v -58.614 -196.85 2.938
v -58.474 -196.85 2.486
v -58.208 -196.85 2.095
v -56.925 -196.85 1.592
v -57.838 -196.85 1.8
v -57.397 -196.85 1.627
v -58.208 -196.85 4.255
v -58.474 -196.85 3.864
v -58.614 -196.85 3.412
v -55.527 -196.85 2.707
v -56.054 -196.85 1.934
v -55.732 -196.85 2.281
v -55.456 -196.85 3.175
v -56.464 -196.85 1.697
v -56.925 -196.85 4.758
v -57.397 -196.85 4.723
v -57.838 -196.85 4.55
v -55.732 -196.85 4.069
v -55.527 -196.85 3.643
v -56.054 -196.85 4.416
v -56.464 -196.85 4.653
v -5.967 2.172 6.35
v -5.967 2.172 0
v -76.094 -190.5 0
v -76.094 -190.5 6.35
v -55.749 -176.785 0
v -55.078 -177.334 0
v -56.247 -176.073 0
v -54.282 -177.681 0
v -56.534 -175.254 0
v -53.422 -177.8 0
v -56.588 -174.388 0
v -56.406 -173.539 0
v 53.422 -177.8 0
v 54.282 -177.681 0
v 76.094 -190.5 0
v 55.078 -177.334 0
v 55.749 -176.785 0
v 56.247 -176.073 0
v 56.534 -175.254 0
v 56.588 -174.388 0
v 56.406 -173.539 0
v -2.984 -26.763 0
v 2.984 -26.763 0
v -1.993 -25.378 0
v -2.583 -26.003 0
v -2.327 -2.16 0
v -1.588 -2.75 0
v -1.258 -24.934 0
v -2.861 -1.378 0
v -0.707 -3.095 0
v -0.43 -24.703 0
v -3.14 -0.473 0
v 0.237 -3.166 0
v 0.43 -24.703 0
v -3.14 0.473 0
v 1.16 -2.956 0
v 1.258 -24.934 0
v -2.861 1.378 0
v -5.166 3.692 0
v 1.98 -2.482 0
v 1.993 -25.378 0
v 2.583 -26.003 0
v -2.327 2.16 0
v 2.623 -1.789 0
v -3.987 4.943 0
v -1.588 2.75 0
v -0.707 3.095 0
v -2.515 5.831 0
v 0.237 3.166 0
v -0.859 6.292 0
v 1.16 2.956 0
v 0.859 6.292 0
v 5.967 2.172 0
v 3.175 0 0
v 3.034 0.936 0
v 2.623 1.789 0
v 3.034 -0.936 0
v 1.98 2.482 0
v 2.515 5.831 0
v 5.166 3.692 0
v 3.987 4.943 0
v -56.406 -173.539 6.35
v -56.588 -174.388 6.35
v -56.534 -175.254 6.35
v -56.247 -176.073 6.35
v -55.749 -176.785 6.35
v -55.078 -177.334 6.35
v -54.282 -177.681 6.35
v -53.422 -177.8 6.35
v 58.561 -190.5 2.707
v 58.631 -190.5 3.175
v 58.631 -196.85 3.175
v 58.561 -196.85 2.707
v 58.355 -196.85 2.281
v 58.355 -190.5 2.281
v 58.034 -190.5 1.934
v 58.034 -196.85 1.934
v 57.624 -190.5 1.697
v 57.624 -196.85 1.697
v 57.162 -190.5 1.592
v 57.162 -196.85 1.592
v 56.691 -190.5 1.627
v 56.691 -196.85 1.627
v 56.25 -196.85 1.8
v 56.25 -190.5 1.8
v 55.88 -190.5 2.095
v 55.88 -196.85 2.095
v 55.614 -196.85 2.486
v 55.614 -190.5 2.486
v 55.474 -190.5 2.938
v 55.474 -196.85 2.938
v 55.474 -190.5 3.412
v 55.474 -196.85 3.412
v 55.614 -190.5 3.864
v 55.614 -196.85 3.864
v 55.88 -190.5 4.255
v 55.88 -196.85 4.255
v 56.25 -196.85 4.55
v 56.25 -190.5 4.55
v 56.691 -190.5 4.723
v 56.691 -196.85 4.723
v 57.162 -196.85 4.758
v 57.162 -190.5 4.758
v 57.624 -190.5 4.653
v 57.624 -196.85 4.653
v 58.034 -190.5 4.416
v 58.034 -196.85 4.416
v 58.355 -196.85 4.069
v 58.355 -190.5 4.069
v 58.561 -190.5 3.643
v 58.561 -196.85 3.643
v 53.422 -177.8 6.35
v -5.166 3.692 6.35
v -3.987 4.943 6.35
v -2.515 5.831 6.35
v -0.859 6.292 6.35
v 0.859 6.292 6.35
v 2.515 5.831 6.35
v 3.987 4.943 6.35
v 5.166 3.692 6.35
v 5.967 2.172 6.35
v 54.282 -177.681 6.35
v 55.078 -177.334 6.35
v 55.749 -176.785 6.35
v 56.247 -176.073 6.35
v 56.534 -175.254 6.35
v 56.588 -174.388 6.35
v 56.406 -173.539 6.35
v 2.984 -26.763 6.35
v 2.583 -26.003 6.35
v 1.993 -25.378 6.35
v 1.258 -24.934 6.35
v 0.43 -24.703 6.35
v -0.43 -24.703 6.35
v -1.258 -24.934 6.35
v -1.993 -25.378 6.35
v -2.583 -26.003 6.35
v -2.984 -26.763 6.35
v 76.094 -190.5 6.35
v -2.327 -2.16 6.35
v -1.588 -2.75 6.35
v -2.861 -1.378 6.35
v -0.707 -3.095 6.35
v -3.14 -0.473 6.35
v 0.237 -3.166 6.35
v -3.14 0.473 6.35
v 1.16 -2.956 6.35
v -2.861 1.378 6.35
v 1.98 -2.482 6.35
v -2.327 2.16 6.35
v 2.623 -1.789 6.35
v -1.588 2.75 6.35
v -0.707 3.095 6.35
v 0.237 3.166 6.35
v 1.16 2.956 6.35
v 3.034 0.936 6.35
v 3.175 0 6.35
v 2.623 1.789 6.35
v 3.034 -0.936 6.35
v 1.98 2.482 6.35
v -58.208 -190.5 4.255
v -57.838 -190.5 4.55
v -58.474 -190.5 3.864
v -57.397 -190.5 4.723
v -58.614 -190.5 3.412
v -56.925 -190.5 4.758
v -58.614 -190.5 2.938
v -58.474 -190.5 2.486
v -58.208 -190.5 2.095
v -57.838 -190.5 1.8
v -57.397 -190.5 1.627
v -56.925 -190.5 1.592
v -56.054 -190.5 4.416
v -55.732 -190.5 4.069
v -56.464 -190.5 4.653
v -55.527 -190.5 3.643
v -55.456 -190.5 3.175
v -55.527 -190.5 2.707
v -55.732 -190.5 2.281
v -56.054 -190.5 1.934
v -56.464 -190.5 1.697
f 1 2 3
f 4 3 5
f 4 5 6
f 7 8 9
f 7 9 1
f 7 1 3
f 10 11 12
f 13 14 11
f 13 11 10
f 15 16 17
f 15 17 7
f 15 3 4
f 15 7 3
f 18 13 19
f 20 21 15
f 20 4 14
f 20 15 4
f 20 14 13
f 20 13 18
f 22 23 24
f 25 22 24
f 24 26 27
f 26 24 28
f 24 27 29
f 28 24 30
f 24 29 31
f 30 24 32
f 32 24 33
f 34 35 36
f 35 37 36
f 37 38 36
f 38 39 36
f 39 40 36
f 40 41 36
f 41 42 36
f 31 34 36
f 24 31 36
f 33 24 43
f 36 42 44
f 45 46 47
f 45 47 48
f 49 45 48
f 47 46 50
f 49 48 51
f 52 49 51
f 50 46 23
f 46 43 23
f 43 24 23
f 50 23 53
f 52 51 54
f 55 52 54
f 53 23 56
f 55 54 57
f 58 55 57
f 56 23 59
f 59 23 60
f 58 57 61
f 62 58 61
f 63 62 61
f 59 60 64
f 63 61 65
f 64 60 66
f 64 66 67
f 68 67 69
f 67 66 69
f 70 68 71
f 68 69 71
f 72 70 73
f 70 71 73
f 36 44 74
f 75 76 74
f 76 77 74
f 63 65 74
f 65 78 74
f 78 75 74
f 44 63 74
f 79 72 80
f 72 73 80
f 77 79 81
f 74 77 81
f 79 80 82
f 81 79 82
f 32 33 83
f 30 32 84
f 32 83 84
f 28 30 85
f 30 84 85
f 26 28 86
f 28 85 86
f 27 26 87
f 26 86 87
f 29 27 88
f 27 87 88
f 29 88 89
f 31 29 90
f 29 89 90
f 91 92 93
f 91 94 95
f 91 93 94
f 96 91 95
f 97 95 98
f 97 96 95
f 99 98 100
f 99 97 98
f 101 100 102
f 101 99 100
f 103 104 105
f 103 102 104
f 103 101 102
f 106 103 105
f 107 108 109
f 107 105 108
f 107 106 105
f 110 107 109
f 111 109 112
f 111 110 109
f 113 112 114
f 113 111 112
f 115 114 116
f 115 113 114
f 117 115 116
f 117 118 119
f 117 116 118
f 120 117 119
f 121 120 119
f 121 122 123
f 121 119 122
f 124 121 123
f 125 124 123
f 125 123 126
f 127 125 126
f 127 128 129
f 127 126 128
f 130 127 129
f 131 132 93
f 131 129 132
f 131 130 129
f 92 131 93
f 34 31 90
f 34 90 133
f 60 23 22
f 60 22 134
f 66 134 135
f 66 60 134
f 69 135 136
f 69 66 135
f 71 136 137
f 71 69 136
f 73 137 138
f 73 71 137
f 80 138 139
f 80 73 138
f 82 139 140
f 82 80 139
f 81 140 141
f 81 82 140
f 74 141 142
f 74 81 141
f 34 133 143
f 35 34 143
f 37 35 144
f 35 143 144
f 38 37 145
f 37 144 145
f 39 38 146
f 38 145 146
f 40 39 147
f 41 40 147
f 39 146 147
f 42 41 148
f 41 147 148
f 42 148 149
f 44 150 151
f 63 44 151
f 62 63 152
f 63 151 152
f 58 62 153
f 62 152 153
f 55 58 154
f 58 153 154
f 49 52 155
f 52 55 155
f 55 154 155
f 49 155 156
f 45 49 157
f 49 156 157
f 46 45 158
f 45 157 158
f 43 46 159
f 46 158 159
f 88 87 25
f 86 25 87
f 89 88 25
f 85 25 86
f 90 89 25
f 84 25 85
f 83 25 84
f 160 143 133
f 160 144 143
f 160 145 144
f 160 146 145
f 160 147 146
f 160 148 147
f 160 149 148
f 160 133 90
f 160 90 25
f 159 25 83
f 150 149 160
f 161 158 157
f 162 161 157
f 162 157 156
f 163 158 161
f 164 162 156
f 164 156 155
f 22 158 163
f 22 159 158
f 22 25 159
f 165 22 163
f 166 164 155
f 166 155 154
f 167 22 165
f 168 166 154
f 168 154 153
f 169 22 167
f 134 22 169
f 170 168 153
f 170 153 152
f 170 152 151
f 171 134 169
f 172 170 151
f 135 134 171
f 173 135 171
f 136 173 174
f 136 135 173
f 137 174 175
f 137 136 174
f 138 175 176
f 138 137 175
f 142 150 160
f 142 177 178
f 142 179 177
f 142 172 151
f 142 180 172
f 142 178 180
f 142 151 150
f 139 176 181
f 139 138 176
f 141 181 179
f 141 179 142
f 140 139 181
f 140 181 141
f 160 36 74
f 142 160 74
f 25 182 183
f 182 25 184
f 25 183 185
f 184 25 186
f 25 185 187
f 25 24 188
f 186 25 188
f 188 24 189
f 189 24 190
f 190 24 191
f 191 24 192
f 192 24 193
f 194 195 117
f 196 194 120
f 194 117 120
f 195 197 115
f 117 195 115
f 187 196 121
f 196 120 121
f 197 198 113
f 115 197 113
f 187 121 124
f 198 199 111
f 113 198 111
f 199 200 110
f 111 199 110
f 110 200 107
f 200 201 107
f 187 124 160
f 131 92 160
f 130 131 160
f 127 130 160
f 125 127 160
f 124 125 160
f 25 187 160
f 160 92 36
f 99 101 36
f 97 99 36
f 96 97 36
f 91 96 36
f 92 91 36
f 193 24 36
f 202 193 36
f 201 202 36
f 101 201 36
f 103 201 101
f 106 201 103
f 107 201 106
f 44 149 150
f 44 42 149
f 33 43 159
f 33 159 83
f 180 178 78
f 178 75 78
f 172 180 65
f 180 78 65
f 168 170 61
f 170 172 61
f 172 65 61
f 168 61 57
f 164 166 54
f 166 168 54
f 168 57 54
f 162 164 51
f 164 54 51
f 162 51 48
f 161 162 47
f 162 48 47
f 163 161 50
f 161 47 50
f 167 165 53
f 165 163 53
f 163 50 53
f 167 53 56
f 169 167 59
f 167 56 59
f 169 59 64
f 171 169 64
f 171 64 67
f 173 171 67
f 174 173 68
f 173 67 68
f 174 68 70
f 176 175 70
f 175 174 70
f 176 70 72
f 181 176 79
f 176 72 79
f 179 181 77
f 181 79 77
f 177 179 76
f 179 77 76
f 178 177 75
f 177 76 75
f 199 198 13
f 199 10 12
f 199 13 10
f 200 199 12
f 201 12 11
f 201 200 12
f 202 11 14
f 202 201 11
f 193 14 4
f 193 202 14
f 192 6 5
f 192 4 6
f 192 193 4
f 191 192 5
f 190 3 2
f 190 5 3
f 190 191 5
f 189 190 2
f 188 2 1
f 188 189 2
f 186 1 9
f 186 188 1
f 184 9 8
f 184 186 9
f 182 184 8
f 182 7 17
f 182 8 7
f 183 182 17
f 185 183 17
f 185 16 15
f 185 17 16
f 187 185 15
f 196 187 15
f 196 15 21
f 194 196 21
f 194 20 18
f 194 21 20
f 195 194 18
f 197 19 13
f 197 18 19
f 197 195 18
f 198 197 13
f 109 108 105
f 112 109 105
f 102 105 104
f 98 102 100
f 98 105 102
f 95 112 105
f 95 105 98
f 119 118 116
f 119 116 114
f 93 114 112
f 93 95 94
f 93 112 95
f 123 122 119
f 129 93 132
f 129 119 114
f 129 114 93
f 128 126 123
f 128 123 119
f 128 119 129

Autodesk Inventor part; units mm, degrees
ref_plane "YZ Plane" through (0, 0, 0) normal (1, 0, 0) x (0, 1, 0)
ref_plane "XZ Plane" through (0, 0, 0) normal (0, 1, 0) x (-1, 0, 0)
ref_plane "XY Plane" through (0, 0, 0) normal (0, 0, 1) x (1, 0, 0)
sketch "Sketch1" plane through (0, 0, 0) normal (0, 0, 1) x (1, 0, 0)
  circle A0 centre (0, 0) radius 3.175
  circle A1 centre (0, 0) radius 6.35
  line L0 (-5.967, 2.1718) -> (-76.0939, -190.5)
  line L1 (-76.0939, -190.5) -> (76.0939, -190.5)
  line L2 (76.0939, -190.5) -> (5.967, 2.1718)
  line L3 (0, -18.5662) -> (-57.9564, -177.8)
  line L4 (-57.9564, -177.8) -> (57.9564, -177.8)
  line L5 (57.9564, -177.8) -> (0, -18.5662)
  dimension "d0" = 6.35
  dimension "d1" = 12.7
  dimension "d2" = 70
  dimension "d3" = 70
  dimension "d4" = 190.5
  dimension "d5" = 12.7
  dimension "d9" = 152.1877
extrude "Extrusion1" add sketch "Sketch1" along normal blind 6.35
fillet "Fillet1" radius 3.175 3 edges at (0, -18.5662, 3.175) (-57.9564, -177.8, 3.175) (57.9564, -177.8, 3.175)
sketch "Sketch2" plane through (-76.0939, -190.5, 0) normal (0, -1, 0) x (1, 0, 0)
  circle A0 centre (19.05, 3.175) radius 1.5875
  circle A1 centre (133.1377, 3.175) radius 1.5875
  line L0 (0, 6.35) -> (152.1877, 6.35) projected
  line L1 (0, 0) -> (0, 6.35) projected
  line L2 (152.1877, 0) -> (152.1877, 6.35) projected
  point P0 (76.0939, 0)
  dimension "d10" = 3.175
  dimension "d11" = 3.175
  dimension "d12" = 19.05
  dimension "d13" = 19.05
extrude "Extrusion2" add sketch "Sketch2" along normal blind 6.35
properties part number "Outside"
